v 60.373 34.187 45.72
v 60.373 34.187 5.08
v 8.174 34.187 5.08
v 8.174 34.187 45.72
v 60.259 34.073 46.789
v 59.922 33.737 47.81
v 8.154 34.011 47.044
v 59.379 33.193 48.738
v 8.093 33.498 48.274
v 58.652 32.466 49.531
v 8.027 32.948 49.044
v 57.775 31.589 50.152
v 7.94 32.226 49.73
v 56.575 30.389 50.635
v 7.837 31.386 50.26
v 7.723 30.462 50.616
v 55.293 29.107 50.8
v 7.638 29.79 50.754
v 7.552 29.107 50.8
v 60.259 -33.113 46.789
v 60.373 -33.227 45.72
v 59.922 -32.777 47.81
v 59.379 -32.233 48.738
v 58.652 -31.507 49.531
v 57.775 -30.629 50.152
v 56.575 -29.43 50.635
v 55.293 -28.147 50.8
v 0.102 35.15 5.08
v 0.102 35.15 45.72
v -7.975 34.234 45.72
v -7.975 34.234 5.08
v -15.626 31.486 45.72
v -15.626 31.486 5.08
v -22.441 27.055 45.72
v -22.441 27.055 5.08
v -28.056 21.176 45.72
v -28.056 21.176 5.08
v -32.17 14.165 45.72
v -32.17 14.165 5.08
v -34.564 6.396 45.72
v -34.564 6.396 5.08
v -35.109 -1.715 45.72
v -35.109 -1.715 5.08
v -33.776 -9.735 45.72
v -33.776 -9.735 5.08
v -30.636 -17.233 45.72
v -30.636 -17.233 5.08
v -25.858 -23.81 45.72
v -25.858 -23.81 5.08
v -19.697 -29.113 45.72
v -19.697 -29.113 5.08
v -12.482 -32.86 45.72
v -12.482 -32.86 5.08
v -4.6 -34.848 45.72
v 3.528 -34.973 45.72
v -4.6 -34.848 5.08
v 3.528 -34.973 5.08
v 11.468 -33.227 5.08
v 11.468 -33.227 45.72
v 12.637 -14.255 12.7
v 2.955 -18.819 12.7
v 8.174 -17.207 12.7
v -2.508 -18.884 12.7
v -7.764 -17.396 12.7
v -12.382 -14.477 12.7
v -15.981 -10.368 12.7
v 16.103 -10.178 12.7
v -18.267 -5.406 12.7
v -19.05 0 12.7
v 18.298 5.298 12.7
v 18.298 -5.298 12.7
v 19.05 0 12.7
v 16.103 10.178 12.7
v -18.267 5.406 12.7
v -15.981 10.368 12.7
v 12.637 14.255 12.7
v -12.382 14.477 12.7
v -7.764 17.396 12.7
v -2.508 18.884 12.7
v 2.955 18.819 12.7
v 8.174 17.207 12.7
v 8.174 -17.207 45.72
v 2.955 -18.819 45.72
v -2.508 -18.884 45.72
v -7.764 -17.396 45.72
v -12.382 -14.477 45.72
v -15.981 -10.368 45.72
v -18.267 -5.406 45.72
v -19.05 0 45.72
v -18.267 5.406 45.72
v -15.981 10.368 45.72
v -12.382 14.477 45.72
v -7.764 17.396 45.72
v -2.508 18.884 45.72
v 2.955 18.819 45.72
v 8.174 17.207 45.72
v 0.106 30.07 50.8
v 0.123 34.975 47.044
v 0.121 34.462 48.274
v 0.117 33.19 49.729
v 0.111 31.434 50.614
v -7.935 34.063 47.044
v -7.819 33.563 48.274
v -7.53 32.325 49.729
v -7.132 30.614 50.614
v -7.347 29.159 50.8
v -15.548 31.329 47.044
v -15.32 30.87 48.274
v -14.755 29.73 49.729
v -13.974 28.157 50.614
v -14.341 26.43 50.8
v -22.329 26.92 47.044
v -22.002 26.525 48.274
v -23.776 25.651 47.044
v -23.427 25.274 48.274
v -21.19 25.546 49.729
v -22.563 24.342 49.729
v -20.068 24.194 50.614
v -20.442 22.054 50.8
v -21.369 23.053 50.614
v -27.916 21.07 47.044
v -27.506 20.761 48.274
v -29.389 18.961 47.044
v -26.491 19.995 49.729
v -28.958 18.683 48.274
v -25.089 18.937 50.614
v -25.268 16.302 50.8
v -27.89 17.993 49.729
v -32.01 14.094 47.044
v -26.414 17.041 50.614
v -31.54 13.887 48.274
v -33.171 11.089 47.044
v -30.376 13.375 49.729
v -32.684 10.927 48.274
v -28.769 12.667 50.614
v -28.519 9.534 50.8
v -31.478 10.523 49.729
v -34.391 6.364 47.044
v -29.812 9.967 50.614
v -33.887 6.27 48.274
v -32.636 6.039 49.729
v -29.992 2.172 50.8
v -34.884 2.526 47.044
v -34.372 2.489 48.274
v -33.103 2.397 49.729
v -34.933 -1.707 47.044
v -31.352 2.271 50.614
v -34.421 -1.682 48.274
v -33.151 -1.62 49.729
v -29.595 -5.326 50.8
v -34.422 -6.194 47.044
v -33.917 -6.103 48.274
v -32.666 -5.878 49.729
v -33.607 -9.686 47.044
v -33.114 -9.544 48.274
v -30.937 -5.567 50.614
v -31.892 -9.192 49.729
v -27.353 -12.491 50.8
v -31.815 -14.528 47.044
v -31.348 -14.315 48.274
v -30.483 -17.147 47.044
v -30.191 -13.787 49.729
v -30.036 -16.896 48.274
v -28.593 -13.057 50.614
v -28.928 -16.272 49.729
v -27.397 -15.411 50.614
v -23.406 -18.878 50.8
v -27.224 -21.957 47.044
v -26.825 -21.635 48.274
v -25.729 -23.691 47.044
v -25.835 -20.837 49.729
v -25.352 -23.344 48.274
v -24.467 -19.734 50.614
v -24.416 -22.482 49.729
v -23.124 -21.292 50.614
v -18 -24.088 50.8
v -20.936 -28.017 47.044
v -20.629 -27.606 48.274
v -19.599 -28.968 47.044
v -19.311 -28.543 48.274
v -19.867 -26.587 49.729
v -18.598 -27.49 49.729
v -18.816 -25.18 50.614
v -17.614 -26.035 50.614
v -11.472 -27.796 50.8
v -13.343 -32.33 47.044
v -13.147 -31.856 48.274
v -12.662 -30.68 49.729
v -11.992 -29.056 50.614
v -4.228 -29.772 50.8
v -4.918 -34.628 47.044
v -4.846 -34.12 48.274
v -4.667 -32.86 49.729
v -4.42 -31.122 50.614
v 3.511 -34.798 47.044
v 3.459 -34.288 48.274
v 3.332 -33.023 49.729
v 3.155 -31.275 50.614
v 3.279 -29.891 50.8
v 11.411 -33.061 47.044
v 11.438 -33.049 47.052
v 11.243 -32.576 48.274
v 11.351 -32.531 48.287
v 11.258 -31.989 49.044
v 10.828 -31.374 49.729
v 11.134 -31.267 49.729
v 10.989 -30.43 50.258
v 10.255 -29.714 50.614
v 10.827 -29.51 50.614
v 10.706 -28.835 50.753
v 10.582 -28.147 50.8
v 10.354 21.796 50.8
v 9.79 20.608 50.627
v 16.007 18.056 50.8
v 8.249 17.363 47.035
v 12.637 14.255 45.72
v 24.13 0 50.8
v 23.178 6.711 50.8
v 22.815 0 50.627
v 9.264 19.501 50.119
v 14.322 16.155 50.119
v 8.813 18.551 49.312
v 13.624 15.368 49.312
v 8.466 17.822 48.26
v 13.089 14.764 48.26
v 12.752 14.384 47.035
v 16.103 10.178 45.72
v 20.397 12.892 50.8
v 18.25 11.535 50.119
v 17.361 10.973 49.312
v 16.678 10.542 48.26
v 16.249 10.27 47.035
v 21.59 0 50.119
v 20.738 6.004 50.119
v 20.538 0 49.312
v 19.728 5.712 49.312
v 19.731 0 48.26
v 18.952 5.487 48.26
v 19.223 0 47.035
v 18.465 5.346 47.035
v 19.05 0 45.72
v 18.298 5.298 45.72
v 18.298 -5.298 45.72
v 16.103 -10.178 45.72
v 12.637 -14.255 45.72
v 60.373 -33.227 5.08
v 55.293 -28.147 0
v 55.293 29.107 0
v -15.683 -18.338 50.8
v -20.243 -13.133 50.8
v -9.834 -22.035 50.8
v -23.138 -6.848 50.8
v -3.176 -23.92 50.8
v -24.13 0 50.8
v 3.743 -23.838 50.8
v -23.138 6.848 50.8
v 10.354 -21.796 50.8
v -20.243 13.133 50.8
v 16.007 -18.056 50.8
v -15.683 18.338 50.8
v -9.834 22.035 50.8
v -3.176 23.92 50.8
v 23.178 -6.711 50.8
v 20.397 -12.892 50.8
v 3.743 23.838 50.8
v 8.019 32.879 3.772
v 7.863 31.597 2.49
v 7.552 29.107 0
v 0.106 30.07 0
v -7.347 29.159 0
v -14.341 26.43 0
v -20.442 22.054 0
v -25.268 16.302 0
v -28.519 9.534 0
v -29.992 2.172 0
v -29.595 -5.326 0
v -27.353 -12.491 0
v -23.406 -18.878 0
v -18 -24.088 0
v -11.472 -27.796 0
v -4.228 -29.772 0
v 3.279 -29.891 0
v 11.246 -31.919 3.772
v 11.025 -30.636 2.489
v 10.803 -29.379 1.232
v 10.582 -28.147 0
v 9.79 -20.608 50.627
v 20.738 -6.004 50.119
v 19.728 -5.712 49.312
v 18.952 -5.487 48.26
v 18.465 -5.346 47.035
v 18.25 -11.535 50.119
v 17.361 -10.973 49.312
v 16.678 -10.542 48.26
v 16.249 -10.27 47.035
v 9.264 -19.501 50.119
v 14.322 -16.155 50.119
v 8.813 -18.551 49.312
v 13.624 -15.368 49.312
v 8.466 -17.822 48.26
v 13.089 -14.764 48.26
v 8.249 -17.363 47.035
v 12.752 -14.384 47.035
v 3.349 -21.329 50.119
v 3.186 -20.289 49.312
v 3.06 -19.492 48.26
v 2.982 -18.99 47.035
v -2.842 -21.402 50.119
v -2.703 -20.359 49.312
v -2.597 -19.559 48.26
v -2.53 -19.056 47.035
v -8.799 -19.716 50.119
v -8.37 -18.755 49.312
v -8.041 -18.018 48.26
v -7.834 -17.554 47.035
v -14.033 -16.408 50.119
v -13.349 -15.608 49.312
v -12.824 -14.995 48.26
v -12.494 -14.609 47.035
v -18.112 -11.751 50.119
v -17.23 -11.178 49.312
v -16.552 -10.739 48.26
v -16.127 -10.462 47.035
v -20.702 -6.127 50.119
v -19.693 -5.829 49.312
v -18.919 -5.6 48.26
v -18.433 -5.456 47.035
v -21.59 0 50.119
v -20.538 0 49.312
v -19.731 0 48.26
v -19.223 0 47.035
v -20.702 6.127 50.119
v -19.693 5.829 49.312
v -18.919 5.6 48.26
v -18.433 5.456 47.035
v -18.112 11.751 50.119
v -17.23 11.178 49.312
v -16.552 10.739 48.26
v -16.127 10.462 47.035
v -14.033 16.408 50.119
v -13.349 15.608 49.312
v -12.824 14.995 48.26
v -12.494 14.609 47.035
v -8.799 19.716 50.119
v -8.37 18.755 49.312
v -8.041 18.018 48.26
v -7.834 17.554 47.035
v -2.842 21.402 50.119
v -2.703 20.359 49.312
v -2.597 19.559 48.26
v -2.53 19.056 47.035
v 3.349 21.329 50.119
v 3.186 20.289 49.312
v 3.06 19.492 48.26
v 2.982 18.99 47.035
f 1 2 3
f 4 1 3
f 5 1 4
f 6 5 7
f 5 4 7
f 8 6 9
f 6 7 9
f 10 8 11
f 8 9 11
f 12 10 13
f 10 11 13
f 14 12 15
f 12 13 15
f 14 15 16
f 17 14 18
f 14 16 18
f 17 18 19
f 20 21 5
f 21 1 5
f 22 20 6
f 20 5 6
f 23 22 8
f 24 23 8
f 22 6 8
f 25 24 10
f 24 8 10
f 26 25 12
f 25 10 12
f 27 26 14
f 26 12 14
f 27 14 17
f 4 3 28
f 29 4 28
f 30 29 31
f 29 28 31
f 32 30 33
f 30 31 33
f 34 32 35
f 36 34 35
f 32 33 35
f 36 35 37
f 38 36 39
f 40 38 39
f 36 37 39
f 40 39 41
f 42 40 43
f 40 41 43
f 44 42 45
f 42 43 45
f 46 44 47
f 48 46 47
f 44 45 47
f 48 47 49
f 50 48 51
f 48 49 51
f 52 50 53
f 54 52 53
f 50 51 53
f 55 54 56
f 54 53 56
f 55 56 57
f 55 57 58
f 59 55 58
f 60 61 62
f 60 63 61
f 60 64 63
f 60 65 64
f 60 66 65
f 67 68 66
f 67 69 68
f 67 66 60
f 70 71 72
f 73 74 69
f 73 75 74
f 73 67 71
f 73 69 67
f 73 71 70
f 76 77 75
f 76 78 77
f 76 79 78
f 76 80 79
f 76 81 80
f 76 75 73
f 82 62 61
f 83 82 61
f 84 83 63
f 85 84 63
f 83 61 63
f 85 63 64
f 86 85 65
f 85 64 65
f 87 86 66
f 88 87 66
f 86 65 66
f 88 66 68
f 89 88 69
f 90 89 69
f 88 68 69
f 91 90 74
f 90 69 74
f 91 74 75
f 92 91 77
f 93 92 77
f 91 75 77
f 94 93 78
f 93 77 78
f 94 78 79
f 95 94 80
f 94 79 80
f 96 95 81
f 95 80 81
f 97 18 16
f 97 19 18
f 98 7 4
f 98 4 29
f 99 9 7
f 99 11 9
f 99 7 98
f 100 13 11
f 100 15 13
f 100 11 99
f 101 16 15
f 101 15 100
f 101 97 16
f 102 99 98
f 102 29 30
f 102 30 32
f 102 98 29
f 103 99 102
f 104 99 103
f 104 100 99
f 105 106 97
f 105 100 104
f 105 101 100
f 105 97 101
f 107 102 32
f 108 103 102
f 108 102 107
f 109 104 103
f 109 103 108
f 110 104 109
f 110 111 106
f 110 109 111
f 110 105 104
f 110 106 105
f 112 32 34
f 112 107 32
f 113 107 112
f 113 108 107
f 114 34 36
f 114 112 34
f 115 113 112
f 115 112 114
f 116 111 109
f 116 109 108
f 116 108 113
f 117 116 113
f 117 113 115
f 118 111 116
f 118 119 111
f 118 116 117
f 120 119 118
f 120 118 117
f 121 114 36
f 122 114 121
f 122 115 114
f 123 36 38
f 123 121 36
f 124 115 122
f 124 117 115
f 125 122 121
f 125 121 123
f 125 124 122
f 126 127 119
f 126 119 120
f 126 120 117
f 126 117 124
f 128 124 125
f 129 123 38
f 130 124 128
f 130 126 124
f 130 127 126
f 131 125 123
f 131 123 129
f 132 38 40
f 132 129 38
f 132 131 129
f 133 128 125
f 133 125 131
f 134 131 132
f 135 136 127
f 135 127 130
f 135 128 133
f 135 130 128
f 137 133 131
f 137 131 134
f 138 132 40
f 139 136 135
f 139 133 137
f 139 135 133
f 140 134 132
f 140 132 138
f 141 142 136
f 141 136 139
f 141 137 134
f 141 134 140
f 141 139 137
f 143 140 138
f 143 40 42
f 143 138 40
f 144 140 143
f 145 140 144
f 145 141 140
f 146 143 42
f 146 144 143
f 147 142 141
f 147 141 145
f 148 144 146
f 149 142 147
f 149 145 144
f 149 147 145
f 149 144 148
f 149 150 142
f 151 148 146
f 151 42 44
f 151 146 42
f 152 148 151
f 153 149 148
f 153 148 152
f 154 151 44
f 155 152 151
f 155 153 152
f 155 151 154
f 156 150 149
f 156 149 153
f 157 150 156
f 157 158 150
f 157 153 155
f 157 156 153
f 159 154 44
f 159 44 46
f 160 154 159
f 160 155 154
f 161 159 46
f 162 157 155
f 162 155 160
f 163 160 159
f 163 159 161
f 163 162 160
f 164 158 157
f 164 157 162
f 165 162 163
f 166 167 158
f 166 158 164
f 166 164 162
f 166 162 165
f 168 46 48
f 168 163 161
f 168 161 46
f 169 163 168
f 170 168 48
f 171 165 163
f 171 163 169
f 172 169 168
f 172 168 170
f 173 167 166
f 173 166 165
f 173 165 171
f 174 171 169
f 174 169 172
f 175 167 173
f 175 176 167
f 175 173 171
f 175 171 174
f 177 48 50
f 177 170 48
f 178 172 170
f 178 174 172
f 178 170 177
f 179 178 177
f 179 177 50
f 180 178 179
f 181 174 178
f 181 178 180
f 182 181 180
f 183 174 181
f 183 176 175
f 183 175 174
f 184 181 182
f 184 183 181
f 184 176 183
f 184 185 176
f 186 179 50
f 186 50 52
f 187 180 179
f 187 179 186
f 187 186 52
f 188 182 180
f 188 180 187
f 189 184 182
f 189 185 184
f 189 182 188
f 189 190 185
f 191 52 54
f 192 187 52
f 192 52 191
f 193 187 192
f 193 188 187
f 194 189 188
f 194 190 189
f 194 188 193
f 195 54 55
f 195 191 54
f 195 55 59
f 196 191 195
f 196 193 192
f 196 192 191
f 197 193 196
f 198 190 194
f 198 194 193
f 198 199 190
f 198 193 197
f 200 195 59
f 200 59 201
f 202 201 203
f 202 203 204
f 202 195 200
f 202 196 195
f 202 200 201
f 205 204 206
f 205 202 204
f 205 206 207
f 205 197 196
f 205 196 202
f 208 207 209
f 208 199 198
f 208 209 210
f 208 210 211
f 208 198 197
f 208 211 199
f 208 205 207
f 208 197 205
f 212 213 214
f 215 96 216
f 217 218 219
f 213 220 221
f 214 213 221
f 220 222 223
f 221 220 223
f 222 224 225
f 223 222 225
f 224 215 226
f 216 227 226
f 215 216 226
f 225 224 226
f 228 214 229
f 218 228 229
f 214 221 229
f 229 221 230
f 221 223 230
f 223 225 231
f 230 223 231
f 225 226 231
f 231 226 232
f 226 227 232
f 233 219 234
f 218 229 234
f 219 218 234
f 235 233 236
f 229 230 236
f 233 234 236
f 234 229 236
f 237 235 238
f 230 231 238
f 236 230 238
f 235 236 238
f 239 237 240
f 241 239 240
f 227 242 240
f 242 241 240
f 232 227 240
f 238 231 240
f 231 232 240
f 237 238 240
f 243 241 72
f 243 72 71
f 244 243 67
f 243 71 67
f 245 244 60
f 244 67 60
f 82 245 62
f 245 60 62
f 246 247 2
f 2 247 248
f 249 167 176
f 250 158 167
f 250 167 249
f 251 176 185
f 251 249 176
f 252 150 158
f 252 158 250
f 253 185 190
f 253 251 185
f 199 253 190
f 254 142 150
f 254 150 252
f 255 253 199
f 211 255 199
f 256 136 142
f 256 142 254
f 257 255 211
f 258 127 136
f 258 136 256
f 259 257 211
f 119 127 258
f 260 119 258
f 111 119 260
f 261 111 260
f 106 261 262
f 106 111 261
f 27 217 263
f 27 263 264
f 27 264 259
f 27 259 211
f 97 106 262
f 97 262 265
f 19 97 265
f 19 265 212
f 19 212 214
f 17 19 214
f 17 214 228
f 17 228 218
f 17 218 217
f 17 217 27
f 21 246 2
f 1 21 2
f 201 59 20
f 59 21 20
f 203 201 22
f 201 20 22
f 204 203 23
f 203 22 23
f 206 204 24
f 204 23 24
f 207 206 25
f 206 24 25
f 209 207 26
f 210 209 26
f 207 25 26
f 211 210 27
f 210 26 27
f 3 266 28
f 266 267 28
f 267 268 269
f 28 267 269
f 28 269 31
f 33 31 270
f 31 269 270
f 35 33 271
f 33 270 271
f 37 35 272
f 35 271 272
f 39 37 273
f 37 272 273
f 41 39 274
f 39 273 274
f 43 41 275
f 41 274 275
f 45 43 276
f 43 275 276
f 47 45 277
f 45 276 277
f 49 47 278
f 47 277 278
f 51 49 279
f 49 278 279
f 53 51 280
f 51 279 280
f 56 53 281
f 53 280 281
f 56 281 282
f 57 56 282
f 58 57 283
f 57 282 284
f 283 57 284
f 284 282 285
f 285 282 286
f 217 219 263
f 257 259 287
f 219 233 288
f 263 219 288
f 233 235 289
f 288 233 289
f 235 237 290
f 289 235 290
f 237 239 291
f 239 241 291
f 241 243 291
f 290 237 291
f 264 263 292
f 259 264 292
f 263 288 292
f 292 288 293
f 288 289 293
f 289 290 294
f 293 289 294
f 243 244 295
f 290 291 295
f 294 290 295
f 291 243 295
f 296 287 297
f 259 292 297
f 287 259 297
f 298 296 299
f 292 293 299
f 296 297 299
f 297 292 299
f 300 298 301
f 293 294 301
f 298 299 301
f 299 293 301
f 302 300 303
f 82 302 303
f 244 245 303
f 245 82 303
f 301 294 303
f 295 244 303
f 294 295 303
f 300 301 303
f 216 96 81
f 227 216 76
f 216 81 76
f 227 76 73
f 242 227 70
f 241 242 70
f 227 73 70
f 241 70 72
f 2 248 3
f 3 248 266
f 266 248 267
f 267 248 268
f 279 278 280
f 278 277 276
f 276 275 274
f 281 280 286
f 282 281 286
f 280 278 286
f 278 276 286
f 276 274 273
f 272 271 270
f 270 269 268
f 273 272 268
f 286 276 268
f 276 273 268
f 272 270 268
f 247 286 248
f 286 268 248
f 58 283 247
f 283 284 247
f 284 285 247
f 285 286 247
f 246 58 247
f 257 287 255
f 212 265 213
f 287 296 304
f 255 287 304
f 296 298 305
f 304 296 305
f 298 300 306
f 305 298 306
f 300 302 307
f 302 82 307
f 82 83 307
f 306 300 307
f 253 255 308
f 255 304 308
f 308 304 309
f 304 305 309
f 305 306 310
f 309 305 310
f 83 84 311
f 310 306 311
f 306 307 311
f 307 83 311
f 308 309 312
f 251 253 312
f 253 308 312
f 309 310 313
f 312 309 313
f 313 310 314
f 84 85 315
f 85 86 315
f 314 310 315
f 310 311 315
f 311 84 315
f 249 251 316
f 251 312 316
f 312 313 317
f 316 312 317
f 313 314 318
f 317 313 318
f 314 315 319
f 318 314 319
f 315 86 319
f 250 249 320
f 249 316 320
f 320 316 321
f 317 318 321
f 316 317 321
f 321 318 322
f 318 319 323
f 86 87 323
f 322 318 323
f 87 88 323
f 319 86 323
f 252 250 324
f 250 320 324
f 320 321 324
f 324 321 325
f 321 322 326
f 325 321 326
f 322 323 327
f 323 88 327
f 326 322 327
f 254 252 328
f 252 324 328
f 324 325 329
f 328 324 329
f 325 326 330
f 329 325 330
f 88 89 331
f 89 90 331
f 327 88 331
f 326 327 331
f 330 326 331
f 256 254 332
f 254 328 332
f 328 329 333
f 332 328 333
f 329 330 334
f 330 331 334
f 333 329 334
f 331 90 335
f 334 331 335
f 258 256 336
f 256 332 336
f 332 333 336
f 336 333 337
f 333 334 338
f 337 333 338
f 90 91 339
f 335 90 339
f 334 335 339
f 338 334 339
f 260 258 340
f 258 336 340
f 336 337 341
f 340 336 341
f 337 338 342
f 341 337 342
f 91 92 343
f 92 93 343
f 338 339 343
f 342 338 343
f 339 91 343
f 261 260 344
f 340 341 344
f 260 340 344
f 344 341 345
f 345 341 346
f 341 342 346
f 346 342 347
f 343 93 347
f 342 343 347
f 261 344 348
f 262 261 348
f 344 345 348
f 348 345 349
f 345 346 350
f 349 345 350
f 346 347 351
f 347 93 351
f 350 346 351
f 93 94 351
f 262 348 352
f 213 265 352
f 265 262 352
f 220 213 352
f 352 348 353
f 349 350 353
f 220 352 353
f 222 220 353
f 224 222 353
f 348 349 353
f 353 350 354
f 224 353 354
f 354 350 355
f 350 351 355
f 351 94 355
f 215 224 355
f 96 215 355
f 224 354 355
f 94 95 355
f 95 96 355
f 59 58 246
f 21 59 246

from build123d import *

# Parameters (mm, degrees)
F1_DEPTH = 50.8
F2_SIZE  = 5.08
F4_DEPTH = 12.7
F5_R     = 5.08
F6_R     = 5.08


with BuildPart() as f1:
    # F0 (on Top) → F1 (new body)
    with BuildSketch(Plane.XY):
        with BuildLine():
            ThreePointArc((11.4679807678, -33.227154294), (28.6239736934, -20.4016297233), (35.1505101722, 0))
            ThreePointArc((35.1505101722, 0), (27.5943099323, 21.7741228234), (8.1743768298, 34.186809281))
            Line((8.1743768298, 34.186809281), (8.1743768298, 17.2070352892))
            ThreePointArc((8.1743768298, 17.2070352892), (16.1031732681, 10.1779325354), (19.05, 0))
            ThreePointArc((19.05, 0), (16.1031732681, -10.1779325354), (8.1743768298, -17.2070352892))
            Line((8.1743768298, -17.2070352892), (8.1743768298, -33.227154294))
            Line((8.1743768298, -33.227154294), (11.4679807678, -33.227154294))
        make_face()
        with BuildLine():
            ThreePointArc((8.1743768298, 34.186809281), (27.5943099323, 21.7741228234), (35.1505101722, 0))
            ThreePointArc((35.1505101722, 0), (28.6239736934, -20.4016297233), (11.4679807678, -33.227154294))
            Line((11.4679807678, -33.227154294), (60.3725549432, -33.227154294))
            Line((60.3725549432, -33.227154294), (60.3725549432, 34.186809281))
            Line((60.3725549432, 34.186809281), (8.1743768298, 34.186809281))
        make_face()
        with BuildLine():
            Line((8.1743768298, 17.2070352892), (8.1743768298, 34.186809281))
            ThreePointArc((8.1743768298, 34.186809281), (-35.1086338985, -1.7152816528), (11.4679807678, -33.227154294))
            Line((11.4679807678, -33.227154294), (8.1743768298, -33.227154294))
            Line((8.1743768298, -33.227154294), (8.1743768298, -17.2070352892))
            ThreePointArc((8.1743768298, -17.2070352892), (-19.05, 0), (8.1743768298, 17.2070352892))
        make_face()
    extrude(amount=F1_DEPTH)

    # F2
    f2_edges = [f1.edges().sort_by_distance(p)[0] for p in [
        (-35.108634, -1.715282, 0),
        (34.273466, 34.186809, 0),
        (60.372555, 0.479827, 0),
        (35.920268, -33.227154, 0),
    ]]
    chamfer(f2_edges, length=F2_SIZE)

    # F3 (on Top) → F4 (join)
    with BuildSketch(Plane.XY):
        with BuildLine():
            Line((9.958841659, 26.0848395173), (9.958841659, -26.0848395173))
            ThreePointArc((9.958841659, -26.0848395173), (22.9963138093, -15.8356222175), (27.9212710998, 0))
            ThreePointArc((27.9212710998, 0), (22.9963138093, 15.8356222175), (9.958841659, 26.0848395173))
        make_face()
        with BuildLine():
            ThreePointArc((27.9212710998, 0), (22.9963138093, -15.8356222175), (9.958841659, -26.0848395173))
            Line((9.958841659, -26.0848395173), (51.6148433089, -26.0848395173))
            Line((51.6148433089, -26.0848395173), (51.6148433089, 26.8565043807))
            Line((51.6148433089, 26.8565043807), (9.958841659, 26.8565043807))
            Line((9.958841659, 26.8565043807), (9.958841659, 26.0848395173))
            ThreePointArc((9.958841659, 26.0848395173), (22.9963138093, 15.8356222175), (27.9212710998, 0))
        make_face()
        with BuildLine():
            ThreePointArc((9.958841659, 26.0848395173), (-27.9212710998, 0), (9.958841659, -26.0848395173))
            Line((9.958841659, -26.0848395173), (9.958841659, 26.0848395173))
        make_face()
    extrude(amount=F4_DEPTH)

    # F5
    f5_edges = [f1.edges().sort_by_distance(p)[0] for p in [
        (-35.108634, -1.715282, 50.8),
        (35.920268, -33.227154, 50.8),
        (60.372555, 0.479827, 50.8),
        (34.273466, 34.186809, 50.8),
    ]]
    fillet(f5_edges, radius=F5_R)

    # F6
    f6_edges = [f1.edges().sort_by_distance(p)[0] for p in [
        (-8.174377, 17.207035, 50.8),
    ]]
    fillet(f6_edges, radius=F6_R)


solid = f1.part
